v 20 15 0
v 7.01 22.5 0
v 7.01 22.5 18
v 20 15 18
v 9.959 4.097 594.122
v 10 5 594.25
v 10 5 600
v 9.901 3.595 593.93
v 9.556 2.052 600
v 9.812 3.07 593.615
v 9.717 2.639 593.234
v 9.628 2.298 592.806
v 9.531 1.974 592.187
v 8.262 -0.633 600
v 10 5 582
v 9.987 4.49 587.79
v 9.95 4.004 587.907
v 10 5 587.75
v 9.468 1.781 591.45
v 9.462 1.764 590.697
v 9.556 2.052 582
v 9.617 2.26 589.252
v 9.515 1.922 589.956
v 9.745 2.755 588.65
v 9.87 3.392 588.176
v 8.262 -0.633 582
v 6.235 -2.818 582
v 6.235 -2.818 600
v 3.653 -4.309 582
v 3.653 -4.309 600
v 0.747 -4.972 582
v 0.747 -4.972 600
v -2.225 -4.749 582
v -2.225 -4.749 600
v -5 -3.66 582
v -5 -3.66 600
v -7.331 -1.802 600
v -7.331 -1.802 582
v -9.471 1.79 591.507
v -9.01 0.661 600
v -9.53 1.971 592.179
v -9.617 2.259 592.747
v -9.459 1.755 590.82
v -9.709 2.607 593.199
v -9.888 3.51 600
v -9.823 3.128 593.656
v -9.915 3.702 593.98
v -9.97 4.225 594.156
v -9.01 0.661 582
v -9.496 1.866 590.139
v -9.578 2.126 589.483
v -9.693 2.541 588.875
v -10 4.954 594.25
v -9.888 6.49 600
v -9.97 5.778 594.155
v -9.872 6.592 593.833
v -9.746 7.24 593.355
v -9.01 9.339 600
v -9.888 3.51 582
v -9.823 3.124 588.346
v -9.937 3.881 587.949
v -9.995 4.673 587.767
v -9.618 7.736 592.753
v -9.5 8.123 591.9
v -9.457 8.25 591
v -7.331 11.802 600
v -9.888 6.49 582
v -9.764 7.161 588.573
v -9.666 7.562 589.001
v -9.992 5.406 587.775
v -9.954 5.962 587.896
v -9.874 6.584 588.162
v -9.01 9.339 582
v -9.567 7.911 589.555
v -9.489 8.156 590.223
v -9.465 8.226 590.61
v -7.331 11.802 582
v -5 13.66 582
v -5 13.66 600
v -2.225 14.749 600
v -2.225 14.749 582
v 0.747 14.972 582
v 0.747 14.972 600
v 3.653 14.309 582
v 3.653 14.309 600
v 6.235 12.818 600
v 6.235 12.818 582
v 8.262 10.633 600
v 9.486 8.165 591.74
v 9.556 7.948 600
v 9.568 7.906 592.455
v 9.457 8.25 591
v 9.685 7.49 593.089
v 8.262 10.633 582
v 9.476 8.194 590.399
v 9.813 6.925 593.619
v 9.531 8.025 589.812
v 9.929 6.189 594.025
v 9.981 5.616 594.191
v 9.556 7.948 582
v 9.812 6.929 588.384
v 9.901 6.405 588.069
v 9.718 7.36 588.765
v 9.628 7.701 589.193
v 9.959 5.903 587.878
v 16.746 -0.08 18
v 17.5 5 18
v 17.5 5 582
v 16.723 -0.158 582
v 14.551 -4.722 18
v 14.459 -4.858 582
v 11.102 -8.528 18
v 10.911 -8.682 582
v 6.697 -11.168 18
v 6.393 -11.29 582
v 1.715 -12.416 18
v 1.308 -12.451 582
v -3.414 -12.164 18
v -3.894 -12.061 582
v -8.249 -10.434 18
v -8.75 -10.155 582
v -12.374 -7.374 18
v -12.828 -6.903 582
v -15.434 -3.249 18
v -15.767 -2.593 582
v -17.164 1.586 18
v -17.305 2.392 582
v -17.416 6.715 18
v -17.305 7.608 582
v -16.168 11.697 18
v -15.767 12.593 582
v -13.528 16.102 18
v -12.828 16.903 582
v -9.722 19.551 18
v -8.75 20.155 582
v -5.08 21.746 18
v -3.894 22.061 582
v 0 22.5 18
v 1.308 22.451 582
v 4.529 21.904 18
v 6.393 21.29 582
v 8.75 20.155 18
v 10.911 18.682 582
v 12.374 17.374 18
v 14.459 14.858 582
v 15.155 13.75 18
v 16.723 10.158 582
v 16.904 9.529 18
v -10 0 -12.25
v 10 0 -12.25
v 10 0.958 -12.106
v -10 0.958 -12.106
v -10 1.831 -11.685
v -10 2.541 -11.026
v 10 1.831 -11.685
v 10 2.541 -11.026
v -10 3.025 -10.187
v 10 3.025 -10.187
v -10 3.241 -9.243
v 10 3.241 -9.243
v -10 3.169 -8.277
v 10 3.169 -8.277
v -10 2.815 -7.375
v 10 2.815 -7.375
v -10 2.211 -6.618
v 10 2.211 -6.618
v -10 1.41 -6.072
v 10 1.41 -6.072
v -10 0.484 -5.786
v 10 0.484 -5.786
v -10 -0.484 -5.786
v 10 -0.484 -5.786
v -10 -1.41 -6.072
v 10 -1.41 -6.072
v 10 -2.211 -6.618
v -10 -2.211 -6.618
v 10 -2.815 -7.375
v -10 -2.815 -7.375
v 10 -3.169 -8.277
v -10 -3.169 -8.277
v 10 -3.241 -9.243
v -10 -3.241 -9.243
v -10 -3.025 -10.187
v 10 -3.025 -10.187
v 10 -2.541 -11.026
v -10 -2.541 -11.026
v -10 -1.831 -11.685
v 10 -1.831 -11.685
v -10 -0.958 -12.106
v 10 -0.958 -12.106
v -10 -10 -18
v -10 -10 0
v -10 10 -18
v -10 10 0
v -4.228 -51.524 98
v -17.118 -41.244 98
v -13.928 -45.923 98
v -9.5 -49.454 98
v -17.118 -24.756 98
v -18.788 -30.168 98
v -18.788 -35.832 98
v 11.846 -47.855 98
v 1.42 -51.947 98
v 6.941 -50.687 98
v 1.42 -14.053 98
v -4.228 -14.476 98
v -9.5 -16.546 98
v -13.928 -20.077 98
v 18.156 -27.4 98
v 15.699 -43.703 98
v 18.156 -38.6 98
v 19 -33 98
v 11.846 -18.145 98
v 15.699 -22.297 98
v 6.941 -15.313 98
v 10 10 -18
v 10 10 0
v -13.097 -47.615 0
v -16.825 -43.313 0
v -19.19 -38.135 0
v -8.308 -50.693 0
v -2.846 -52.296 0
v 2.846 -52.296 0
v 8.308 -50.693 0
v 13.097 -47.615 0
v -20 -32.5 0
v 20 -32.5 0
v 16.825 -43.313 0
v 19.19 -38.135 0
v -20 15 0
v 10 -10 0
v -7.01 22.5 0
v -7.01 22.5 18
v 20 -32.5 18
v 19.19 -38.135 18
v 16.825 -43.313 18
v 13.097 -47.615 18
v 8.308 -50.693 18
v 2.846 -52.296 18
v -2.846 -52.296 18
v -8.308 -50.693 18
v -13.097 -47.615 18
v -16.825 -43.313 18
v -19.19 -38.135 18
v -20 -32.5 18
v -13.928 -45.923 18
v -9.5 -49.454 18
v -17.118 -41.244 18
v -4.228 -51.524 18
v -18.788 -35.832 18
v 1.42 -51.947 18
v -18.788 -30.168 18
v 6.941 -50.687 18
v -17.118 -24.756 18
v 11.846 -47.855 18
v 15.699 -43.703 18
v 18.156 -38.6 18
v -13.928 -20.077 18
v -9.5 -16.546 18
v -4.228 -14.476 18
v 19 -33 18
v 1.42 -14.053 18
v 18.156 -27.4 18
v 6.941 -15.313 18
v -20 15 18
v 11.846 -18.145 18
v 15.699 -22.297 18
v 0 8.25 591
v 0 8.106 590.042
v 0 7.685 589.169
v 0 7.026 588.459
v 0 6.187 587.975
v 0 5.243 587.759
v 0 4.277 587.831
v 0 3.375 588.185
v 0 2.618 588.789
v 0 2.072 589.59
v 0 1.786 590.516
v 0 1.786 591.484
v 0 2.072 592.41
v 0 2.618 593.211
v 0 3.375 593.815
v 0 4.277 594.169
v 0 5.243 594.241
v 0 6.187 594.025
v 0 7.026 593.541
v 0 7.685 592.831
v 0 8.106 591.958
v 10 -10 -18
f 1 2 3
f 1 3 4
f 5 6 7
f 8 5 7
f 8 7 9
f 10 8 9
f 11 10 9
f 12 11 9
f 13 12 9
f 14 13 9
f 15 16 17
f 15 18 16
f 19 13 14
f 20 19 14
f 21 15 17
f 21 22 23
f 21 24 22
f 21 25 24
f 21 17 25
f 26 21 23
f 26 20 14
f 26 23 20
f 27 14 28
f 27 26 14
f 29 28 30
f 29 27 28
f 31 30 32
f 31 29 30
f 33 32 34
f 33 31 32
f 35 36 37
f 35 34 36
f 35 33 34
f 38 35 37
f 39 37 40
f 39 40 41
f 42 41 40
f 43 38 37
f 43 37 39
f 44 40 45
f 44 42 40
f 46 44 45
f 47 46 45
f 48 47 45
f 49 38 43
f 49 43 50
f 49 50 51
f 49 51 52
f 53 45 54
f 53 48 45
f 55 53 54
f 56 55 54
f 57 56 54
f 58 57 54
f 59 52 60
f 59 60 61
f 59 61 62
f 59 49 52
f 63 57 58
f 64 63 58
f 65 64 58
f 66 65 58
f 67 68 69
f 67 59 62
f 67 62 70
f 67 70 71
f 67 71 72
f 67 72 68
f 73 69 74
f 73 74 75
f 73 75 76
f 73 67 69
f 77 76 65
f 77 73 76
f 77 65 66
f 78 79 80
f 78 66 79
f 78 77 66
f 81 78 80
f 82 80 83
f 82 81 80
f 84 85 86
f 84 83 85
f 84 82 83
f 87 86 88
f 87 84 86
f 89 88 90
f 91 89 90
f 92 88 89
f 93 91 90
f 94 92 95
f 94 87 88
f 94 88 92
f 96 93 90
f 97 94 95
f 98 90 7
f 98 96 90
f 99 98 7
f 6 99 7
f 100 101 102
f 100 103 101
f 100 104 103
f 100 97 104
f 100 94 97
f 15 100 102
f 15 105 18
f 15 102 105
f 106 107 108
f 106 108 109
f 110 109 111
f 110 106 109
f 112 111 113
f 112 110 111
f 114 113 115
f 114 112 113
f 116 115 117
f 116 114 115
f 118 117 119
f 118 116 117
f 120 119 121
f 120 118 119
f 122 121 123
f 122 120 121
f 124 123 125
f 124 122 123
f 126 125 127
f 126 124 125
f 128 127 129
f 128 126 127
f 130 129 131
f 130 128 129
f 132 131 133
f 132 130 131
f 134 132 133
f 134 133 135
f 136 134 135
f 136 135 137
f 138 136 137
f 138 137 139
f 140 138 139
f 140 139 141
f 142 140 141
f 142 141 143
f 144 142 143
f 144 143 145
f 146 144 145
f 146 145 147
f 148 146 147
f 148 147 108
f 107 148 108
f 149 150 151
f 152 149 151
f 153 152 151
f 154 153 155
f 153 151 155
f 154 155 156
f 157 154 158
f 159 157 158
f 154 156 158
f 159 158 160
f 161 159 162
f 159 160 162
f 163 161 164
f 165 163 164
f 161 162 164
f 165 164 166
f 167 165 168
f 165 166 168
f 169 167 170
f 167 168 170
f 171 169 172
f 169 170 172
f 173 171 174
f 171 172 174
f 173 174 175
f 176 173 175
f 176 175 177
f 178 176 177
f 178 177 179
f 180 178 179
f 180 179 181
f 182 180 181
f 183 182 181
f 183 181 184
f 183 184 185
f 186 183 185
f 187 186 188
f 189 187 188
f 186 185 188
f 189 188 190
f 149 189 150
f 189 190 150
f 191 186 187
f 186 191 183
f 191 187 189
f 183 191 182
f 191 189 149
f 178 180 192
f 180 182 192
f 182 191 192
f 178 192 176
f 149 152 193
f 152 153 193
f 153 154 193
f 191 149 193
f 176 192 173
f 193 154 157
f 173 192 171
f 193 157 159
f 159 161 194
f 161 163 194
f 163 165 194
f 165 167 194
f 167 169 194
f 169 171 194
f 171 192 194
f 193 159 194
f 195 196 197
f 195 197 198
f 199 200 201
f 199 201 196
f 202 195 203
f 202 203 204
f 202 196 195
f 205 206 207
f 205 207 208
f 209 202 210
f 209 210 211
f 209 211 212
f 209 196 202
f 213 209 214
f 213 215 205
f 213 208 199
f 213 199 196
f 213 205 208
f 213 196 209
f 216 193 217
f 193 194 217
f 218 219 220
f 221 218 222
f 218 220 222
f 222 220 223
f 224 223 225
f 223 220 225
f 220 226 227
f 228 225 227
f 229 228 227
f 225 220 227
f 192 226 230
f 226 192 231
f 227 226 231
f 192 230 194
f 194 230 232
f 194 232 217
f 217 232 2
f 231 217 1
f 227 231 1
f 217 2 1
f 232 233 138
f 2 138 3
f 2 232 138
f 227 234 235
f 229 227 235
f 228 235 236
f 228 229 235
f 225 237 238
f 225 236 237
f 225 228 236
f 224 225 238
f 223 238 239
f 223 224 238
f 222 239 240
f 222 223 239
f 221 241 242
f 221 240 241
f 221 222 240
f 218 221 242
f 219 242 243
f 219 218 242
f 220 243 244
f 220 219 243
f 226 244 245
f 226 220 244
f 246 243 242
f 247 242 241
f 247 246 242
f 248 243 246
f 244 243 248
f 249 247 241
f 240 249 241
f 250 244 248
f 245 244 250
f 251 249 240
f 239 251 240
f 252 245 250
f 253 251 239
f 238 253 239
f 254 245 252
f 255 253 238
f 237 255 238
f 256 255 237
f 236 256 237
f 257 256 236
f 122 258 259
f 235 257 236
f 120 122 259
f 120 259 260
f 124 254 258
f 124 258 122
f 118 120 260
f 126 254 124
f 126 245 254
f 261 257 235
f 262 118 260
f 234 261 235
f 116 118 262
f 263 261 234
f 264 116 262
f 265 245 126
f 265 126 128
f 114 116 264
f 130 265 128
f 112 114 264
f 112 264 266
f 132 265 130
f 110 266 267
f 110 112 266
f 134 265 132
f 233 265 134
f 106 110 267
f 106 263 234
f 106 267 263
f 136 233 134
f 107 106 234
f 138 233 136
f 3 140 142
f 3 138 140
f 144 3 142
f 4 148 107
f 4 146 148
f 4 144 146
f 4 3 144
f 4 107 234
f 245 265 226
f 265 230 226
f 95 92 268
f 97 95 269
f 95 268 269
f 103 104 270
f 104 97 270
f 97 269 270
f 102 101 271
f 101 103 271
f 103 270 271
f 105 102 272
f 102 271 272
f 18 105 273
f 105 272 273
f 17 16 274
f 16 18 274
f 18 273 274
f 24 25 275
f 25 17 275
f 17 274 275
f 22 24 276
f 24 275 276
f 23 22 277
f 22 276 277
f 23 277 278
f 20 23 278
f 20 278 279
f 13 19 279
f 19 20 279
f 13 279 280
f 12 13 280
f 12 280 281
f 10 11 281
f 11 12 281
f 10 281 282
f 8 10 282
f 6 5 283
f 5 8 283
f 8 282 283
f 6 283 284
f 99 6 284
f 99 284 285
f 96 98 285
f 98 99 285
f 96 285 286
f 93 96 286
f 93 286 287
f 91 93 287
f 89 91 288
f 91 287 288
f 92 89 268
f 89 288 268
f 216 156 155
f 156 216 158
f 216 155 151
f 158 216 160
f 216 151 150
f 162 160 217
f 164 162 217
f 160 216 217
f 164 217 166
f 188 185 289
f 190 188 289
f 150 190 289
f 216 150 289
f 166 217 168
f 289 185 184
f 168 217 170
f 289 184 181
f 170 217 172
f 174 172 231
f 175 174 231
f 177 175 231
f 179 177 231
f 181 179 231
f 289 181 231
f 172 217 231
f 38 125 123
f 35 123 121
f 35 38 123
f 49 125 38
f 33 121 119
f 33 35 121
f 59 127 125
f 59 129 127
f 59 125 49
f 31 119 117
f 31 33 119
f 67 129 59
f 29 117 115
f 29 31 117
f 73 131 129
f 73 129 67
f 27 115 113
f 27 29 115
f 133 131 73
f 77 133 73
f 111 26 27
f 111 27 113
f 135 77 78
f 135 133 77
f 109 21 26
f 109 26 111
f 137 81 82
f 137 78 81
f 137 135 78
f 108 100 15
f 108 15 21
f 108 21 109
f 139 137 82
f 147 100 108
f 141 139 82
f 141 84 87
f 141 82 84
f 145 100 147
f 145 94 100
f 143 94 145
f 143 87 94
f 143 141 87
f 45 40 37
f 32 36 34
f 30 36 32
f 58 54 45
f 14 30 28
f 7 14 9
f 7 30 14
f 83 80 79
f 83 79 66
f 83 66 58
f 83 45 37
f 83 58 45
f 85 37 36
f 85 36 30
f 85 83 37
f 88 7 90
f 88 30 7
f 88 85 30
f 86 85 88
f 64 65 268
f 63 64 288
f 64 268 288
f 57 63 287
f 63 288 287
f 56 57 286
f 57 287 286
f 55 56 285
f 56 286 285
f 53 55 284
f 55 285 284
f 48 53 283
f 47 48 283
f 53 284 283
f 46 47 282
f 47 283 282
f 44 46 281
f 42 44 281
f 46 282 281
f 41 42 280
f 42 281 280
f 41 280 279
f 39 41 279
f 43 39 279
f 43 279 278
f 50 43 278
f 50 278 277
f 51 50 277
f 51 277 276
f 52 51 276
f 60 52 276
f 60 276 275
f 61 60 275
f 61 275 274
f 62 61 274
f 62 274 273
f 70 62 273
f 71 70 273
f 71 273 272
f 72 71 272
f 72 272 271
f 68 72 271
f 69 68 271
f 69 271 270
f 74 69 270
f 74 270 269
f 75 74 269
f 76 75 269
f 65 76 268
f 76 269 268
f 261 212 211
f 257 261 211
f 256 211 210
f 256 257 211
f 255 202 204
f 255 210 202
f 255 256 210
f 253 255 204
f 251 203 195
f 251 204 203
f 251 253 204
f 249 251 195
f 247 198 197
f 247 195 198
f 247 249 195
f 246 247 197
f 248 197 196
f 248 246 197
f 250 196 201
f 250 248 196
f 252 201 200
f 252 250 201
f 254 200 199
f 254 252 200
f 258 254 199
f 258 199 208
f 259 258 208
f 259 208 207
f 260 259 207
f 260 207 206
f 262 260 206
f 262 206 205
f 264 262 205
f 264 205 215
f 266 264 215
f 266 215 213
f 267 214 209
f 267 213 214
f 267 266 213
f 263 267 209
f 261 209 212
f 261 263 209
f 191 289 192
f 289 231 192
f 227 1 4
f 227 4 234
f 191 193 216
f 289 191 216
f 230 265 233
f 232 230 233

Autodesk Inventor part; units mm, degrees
ref_plane "YZ Plane" through (0, 0, 0) normal (1, 0, 0) x (0, 1, 0)
ref_plane "XZ Plane" through (0, 0, 0) normal (0, 1, 0) x (-1, 0, 0)
ref_plane "XY Plane" through (0, 0, 0) normal (0, 0, 1) x (1, 0, 0)
sketch "Sketch1" plane through (0, 0, 0) normal (0, 0, 1) x (1, 0, 0)
  line L0 (-10, -10) -> (10, -10)
  line L1 (10, -10) -> (10, 10)
  line L2 (10, 10) -> (-10, 10)
  line L3 (-10, 10) -> (-10, -10)
  line L4 (-10, -10) -> (10, 10) construction
  line L5 (10, -10) -> (-10, 10) construction
  line L6 (-20, 15) -> (-20, -32.5)
  line L7 (-20, 15) -> (-7.0096, 22.5)
  line L8 (-20, 15) -> (-5, 15) construction
  line L9 (-7.0096, 22.5) -> (7.0096, 22.5)
  line L10 (7.0096, 22.5) -> (20, 15)
  line L11 (20, 15) -> (20, -32.5)
  circle A0 centre (0, -32.5) radius 20 construction
  arc A1 (-20, -32.5) -> (20, -32.5) centre (0, -32.5) ccw
  point P0 (0, 0)
  point P1 (0, 22.5)
  point P2 (0, 10)
  dimension "d0" = 20
  dimension "d1" = 20
  dimension "d3" = 15
  dimension "d4" = 30
  dimension "d5" = 15
  dimension "d6" = 150
  dimension "d8" = 40
  dimension "d9" = 5
  dimension "d10" = 40
  dimension "d11" = 55
extrude "Extrusion1" add sketch "Sketch1" along normal blind 18
sketch "Sketch2" plane through (0, 0, 18) normal (0, 0, 1) x (1, 0, 0)
  line L0 (-10, -10) -> (-10, 10) projected
  line L1 (-10, 10) -> (10, 10) projected
  line L2 (10, 10) -> (10, -10) projected
  line L3 (10, -10) -> (-10, -10) projected
  line L4 (-20, 15) -> (-20, -32.5) projected
  arc A0 (-20, -32.5) -> (20, -32.5) centre (0, -32.5) ccw projected
  line L5 (20, -32.5) -> (20, 15) projected
  line L6 (20, 15) -> (7.0096, 22.5) projected
  line L7 (7.0096, 22.5) -> (-7.0096, 22.5) projected
  line L8 (-7.0096, 22.5) -> (-20, 15) projected
  point P0 (0, 0)
extrude "Extrusion2" add sketch "Sketch2" against normal blind 36 contours L0 L1 L2 L3
sketch "Sketch3" plane through (10, -10, 0) normal (1, 0, 0) x (0, 0, -1)
  circle A0 centre (9, 10) radius 3.25
  line L0 (0, 20) -> (18, 20) projected
  line L1 (0, 0) -> (0, 20) projected
  point P0 (0, 10)
  point P1 (9, 20)
  point P2 (0, 10)
  dimension "d16" = 6.5
extrude "Extrusion3" cut sketch "Sketch3" against normal through all
sketch "Sketch4" plane through (0, 0, 18) normal (0, 0, 1) x (1, 0, 0)
  circle A0 centre (0, 5) radius 17.5
  line L0 (7.0096, 22.5) -> (-7.0096, 22.5) projected
  point P0 (0, 0)
  point P1 (0, 22.5)
  dimension "d19" = 35
extrude "Extrusion4" add sketch "Sketch4" along normal blind 564
sketch "Sketch5" plane through (0, 0, 18) normal (0, 0, 1) x (1, 0, 0)
  circle A0 centre (0, -33) radius 19
  circle A1 centre (0, 5) radius 17.5 projected
  point P0 (0, 0)
  dimension "d22" = 38
  dimension "d23" = 38
extrude "Extrusion5" add sketch "Sketch5" along normal blind 80 contours A0
sketch "Sketch6" plane through (0, 5, 582) normal (0, 0, 1) x (1, 0, 0)
  circle A0 centre (0, 0) radius 17.5 projected
  circle A1 centre (0, 0) radius 10
  point P0 (0, -5)
  dimension "d26" = 20
extrude "Extrusion6" add sketch "Sketch6" along normal blind 18 contours A1
sketch "Sketch8" plane through (0, 0, 0) normal (1, 0, 0) x (0, 1, 0)
  line L0 (15, 600) -> (-5, 600) projected
  line L1 (-5, 582) -> (15, 582) projected
  circle A0 centre (5, 591) radius 3.25
  line L2 (15, 600) -> (15, 582)
  line L3 (15, 582) -> (15, 600) projected
  point P0 (0, 0)
  point P1 (15, 591)
  point P2 (5, 582)
  dimension "d29" = 6.5
extrude "Extrusion7" cut sketch "Sketch8" along normal through all both and the other way through all
properties part number "LinearActuator450" material "Steel, Carbon"
